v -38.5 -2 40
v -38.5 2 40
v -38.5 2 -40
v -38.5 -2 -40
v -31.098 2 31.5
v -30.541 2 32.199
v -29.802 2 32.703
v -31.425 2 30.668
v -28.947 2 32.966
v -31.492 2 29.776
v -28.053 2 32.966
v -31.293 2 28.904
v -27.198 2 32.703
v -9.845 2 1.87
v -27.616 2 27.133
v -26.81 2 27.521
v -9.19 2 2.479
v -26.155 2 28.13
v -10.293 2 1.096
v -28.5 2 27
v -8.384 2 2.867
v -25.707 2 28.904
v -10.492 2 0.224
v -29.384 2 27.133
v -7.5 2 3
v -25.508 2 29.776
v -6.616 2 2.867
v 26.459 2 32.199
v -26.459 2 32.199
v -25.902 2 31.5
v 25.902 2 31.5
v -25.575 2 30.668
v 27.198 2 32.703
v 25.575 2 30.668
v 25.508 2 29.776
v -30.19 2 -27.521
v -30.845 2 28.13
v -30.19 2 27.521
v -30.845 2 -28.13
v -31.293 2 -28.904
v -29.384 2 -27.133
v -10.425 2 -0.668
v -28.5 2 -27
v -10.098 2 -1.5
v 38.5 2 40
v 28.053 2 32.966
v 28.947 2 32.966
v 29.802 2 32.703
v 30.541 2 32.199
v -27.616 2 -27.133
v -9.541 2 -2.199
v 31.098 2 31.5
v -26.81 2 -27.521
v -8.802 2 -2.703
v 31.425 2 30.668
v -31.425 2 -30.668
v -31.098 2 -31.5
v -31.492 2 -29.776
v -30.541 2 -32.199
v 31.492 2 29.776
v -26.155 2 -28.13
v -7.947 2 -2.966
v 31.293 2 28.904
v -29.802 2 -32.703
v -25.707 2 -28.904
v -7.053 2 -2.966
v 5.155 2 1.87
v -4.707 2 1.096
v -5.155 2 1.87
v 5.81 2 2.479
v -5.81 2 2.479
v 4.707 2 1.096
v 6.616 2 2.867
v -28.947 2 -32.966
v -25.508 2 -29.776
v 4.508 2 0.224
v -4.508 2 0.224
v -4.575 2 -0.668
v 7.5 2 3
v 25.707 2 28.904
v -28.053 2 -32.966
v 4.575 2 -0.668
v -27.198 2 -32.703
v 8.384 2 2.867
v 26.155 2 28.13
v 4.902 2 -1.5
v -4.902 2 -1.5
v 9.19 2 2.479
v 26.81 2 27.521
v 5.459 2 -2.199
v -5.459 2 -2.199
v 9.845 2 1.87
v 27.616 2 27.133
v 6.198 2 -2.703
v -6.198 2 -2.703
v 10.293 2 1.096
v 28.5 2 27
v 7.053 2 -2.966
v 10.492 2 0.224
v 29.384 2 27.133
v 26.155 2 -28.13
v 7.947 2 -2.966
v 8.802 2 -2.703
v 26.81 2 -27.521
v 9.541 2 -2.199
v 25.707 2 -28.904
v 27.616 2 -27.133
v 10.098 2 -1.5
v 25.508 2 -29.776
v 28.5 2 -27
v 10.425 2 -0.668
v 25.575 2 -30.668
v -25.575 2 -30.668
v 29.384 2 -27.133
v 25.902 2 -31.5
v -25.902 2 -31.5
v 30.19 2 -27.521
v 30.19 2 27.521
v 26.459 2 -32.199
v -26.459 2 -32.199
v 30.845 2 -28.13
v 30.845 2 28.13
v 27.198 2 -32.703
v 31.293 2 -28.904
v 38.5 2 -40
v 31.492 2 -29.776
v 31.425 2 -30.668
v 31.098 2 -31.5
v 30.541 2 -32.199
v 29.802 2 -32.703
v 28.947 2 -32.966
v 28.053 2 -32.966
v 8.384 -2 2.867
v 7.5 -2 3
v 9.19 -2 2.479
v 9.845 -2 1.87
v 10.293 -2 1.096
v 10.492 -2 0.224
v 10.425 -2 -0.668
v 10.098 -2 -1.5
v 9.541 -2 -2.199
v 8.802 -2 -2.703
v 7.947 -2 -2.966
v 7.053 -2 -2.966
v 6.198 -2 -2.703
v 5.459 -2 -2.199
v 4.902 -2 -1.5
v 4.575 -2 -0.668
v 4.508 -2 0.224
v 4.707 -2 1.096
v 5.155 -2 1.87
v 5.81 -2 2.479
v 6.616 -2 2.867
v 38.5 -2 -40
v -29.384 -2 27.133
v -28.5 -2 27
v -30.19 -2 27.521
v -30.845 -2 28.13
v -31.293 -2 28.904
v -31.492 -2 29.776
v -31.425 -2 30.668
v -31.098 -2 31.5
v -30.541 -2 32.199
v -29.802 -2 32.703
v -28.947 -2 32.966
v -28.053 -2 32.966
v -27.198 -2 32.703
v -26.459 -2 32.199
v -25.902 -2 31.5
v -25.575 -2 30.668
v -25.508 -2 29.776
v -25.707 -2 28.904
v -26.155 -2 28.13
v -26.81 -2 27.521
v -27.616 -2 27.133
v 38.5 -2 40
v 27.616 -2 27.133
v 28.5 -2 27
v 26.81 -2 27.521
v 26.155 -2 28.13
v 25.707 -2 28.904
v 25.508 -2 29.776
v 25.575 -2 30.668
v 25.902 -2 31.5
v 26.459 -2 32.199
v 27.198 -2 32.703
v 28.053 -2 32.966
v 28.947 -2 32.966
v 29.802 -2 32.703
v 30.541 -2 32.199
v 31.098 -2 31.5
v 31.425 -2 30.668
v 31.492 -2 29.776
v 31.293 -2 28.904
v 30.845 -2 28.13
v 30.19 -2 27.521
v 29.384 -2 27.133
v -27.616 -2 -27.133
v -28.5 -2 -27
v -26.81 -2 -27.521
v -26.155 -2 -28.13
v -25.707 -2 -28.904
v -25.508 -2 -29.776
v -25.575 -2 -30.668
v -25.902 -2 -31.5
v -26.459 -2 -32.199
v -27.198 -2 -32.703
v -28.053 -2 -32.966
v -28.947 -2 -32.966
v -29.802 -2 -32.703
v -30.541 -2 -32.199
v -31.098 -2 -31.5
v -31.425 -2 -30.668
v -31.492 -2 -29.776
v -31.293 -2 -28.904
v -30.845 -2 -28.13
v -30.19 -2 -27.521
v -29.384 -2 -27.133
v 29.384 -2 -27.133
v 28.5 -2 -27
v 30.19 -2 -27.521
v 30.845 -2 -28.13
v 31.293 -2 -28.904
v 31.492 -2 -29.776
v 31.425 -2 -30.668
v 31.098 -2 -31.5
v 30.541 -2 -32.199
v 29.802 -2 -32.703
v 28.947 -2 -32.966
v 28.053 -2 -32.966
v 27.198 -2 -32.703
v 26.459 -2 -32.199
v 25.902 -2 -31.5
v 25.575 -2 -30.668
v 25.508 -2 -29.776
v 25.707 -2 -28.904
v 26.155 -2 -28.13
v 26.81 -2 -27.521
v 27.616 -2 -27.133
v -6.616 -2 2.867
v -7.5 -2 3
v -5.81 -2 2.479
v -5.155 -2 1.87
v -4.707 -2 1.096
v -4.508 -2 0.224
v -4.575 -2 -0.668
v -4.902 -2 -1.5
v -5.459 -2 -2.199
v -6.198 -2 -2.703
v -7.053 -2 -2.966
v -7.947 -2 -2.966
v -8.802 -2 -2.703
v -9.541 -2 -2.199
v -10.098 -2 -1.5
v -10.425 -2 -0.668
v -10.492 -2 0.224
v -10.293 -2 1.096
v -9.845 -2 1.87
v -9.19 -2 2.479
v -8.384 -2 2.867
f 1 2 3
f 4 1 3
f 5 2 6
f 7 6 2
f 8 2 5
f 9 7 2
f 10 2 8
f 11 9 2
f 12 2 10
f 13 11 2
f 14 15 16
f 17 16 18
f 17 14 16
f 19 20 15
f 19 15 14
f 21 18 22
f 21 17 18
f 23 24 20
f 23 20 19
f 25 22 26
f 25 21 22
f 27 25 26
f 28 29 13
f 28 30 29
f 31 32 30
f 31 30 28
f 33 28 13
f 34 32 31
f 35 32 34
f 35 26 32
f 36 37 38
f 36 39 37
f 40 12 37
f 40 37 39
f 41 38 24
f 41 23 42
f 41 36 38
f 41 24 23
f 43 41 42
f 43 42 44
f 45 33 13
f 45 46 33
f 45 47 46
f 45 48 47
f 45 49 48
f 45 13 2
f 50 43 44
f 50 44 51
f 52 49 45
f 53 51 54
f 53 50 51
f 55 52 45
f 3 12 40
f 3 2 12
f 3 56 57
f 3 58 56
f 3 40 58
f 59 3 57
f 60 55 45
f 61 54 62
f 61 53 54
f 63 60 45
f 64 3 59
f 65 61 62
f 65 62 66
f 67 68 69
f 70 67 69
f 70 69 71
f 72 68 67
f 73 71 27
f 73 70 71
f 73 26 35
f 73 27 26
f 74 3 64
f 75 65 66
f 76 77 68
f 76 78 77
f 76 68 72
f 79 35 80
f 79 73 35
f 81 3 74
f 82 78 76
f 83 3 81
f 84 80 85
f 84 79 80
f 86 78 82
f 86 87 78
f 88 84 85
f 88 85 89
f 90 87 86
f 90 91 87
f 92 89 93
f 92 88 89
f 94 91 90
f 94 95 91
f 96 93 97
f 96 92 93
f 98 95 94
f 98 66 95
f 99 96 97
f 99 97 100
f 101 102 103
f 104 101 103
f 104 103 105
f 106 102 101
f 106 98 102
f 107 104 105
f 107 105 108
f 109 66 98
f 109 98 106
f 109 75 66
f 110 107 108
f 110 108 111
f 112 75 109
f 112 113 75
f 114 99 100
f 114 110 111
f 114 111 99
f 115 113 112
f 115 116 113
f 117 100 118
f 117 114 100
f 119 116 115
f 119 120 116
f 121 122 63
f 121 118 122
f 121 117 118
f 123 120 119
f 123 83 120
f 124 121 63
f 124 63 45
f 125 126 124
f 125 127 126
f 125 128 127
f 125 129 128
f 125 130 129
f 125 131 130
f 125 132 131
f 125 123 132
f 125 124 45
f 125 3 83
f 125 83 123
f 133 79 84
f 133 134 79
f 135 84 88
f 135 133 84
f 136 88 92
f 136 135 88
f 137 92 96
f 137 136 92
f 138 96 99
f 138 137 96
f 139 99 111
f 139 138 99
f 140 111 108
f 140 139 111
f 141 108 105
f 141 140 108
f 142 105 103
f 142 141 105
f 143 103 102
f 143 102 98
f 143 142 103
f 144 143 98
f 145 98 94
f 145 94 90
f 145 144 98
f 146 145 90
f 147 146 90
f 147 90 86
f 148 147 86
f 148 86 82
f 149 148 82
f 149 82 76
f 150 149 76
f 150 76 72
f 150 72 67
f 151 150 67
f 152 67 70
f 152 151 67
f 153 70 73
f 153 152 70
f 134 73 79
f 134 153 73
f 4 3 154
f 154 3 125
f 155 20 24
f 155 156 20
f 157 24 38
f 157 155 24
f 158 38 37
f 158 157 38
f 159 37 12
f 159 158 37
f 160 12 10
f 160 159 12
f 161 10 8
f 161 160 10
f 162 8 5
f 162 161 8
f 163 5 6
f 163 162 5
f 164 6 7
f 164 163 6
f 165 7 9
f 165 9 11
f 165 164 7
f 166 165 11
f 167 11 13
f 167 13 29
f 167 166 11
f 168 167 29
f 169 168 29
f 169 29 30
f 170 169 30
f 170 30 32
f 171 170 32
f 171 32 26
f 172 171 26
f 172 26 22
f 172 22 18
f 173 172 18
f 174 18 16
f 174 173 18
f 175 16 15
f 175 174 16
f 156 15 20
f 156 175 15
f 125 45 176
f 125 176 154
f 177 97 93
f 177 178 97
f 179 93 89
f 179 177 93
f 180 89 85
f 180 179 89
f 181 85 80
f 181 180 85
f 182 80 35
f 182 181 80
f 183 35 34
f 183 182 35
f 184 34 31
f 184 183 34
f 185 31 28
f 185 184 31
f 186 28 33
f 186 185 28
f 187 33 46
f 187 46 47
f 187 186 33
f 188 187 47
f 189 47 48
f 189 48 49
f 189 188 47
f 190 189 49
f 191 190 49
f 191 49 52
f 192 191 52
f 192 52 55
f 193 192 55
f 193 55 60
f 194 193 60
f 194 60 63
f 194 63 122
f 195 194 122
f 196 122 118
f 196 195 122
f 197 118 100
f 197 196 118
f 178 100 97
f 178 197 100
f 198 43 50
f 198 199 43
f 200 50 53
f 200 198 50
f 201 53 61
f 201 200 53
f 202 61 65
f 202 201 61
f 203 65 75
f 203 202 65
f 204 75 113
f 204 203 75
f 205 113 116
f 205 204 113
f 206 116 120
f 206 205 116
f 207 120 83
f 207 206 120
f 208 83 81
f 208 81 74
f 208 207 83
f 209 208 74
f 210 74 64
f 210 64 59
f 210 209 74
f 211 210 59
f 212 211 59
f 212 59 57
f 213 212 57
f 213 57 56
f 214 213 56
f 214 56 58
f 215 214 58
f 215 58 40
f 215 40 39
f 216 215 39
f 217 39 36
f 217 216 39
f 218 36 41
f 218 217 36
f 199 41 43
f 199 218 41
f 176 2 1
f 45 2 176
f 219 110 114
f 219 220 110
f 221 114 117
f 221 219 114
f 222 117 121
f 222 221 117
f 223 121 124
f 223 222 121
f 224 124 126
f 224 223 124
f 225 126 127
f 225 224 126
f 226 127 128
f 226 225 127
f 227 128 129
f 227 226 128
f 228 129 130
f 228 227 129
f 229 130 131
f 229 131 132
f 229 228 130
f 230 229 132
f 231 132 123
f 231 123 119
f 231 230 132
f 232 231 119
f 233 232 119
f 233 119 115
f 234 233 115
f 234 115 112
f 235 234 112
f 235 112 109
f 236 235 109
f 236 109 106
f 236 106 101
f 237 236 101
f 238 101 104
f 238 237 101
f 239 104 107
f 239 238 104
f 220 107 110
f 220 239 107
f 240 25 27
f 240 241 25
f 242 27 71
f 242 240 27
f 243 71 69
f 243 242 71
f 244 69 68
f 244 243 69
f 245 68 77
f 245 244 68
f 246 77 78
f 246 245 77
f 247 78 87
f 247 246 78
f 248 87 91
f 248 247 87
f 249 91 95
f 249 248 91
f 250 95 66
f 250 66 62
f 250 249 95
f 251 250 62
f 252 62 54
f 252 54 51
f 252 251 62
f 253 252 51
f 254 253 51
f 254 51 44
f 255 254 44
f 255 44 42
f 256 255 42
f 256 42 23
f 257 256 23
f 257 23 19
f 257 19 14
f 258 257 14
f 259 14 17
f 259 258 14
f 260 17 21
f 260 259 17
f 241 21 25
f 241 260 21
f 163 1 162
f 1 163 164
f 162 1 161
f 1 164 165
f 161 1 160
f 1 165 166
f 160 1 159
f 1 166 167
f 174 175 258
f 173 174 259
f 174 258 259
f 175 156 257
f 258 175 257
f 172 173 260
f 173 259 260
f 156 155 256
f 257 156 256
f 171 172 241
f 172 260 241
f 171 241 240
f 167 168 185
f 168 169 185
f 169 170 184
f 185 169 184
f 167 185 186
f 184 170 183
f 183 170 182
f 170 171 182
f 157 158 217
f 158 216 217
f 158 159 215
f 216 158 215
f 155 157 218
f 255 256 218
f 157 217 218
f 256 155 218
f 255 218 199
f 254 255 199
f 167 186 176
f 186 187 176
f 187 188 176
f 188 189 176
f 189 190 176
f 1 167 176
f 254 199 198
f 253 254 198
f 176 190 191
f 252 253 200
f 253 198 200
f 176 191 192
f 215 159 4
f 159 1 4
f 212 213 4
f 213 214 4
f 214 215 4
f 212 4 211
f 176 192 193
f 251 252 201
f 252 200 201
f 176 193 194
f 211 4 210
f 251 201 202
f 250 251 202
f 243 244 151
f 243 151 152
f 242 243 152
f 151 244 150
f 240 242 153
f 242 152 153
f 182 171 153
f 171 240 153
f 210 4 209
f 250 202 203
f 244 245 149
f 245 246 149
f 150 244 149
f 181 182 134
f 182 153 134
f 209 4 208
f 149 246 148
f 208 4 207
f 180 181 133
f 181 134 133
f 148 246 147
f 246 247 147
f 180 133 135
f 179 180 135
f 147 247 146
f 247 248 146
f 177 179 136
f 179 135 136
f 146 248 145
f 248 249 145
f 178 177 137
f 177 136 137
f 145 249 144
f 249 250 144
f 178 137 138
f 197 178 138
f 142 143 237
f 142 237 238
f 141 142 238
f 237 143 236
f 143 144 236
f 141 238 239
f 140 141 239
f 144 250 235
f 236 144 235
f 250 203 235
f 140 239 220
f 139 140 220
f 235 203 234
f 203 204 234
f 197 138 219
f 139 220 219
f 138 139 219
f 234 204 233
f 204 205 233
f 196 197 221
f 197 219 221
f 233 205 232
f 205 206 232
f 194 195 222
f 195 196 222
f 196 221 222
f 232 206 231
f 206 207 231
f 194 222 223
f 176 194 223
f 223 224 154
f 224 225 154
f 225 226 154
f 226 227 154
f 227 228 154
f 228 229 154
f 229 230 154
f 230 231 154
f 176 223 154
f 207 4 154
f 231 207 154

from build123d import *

# Parameters (mm, degrees)
SKETCH1_W           = 77
SKETCH1_H           = 80
SKETCH1_R           = 3
BOSS_EXTRUDE1_DEPTH = 2


with BuildPart() as part:
    # Sketch1 → Boss-Extrude1 (new, symmetric)
    with BuildSketch(Plane(origin=(0, 0, 0), x_dir=(1, 0, 0), z_dir=(0, 1, 0))):
        Rectangle(SKETCH1_W, SKETCH1_H)
        with Locations(Location((-7.5, 0, 0), (0, 0, 270))):
            Circle(SKETCH1_R, mode=Mode.SUBTRACT)
        with Locations(Location((7.5, 0, 0), (0, 0, 270))):
            Circle(SKETCH1_R, mode=Mode.SUBTRACT)
        with Locations(Location((-28.5, 30, 0), (0, 0, 270))):
            Circle(SKETCH1_R, mode=Mode.SUBTRACT)
        with Locations(Location((28.5, 30, 0), (0, 0, 270))):
            Circle(SKETCH1_R, mode=Mode.SUBTRACT)
        with Locations(Location((28.5, -30, 0), (0, 0, 90))):
            Circle(SKETCH1_R, mode=Mode.SUBTRACT)
        with Locations(Location((-28.5, -30, 0), (0, 0, 90))):
            Circle(SKETCH1_R, mode=Mode.SUBTRACT)
    extrude(amount=BOSS_EXTRUDE1_DEPTH, both=True)


solid = part.part
